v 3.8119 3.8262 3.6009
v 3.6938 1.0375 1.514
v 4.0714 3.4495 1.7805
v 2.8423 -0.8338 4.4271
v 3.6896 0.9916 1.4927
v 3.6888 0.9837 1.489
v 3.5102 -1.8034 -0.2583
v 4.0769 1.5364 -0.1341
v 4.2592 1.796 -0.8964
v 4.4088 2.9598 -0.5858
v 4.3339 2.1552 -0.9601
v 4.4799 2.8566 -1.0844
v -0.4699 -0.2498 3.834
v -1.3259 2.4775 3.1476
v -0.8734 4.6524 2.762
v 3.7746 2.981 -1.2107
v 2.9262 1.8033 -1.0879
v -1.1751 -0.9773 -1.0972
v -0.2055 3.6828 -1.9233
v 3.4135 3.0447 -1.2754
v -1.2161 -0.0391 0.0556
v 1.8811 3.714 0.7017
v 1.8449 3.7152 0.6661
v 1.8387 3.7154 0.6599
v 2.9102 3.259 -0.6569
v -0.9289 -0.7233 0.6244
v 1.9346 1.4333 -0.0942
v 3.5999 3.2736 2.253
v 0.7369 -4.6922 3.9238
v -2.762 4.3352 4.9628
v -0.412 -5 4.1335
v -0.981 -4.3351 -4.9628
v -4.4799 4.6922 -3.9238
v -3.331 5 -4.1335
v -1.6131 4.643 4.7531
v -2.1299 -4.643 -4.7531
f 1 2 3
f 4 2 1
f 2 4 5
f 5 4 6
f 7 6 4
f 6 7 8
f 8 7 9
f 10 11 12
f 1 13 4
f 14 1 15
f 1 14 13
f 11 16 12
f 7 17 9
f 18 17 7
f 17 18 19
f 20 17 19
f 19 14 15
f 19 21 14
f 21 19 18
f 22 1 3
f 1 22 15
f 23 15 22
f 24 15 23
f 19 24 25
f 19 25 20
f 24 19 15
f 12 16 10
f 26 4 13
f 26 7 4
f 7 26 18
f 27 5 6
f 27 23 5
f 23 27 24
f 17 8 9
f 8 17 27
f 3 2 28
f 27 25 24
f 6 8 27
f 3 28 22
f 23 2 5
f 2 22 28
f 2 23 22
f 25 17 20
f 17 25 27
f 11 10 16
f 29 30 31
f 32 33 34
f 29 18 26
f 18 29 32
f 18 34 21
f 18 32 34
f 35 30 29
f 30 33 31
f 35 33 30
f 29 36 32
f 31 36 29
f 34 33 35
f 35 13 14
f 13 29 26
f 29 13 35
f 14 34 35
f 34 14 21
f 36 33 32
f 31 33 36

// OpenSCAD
translate([-1.175104, -0.977268, -1.097192])
union() {
  rotate([5, 10, 15])
  translate([-1.207756, -3.623267, -3.623267])
  cube(size = [1.207756, 9.662046, 9.058168], center = false);
  rotate([-10, -10, -10])
  difference() {
    cube(size = [4.831023, 4.831023, 4.831023], center = false);
    translate([2.777838, 2.777838, 1.026592])
    rotate([45, 45, 45])
    cube(size = [2.415511, 2.415511, 2.415511], center = false);
  }
}
